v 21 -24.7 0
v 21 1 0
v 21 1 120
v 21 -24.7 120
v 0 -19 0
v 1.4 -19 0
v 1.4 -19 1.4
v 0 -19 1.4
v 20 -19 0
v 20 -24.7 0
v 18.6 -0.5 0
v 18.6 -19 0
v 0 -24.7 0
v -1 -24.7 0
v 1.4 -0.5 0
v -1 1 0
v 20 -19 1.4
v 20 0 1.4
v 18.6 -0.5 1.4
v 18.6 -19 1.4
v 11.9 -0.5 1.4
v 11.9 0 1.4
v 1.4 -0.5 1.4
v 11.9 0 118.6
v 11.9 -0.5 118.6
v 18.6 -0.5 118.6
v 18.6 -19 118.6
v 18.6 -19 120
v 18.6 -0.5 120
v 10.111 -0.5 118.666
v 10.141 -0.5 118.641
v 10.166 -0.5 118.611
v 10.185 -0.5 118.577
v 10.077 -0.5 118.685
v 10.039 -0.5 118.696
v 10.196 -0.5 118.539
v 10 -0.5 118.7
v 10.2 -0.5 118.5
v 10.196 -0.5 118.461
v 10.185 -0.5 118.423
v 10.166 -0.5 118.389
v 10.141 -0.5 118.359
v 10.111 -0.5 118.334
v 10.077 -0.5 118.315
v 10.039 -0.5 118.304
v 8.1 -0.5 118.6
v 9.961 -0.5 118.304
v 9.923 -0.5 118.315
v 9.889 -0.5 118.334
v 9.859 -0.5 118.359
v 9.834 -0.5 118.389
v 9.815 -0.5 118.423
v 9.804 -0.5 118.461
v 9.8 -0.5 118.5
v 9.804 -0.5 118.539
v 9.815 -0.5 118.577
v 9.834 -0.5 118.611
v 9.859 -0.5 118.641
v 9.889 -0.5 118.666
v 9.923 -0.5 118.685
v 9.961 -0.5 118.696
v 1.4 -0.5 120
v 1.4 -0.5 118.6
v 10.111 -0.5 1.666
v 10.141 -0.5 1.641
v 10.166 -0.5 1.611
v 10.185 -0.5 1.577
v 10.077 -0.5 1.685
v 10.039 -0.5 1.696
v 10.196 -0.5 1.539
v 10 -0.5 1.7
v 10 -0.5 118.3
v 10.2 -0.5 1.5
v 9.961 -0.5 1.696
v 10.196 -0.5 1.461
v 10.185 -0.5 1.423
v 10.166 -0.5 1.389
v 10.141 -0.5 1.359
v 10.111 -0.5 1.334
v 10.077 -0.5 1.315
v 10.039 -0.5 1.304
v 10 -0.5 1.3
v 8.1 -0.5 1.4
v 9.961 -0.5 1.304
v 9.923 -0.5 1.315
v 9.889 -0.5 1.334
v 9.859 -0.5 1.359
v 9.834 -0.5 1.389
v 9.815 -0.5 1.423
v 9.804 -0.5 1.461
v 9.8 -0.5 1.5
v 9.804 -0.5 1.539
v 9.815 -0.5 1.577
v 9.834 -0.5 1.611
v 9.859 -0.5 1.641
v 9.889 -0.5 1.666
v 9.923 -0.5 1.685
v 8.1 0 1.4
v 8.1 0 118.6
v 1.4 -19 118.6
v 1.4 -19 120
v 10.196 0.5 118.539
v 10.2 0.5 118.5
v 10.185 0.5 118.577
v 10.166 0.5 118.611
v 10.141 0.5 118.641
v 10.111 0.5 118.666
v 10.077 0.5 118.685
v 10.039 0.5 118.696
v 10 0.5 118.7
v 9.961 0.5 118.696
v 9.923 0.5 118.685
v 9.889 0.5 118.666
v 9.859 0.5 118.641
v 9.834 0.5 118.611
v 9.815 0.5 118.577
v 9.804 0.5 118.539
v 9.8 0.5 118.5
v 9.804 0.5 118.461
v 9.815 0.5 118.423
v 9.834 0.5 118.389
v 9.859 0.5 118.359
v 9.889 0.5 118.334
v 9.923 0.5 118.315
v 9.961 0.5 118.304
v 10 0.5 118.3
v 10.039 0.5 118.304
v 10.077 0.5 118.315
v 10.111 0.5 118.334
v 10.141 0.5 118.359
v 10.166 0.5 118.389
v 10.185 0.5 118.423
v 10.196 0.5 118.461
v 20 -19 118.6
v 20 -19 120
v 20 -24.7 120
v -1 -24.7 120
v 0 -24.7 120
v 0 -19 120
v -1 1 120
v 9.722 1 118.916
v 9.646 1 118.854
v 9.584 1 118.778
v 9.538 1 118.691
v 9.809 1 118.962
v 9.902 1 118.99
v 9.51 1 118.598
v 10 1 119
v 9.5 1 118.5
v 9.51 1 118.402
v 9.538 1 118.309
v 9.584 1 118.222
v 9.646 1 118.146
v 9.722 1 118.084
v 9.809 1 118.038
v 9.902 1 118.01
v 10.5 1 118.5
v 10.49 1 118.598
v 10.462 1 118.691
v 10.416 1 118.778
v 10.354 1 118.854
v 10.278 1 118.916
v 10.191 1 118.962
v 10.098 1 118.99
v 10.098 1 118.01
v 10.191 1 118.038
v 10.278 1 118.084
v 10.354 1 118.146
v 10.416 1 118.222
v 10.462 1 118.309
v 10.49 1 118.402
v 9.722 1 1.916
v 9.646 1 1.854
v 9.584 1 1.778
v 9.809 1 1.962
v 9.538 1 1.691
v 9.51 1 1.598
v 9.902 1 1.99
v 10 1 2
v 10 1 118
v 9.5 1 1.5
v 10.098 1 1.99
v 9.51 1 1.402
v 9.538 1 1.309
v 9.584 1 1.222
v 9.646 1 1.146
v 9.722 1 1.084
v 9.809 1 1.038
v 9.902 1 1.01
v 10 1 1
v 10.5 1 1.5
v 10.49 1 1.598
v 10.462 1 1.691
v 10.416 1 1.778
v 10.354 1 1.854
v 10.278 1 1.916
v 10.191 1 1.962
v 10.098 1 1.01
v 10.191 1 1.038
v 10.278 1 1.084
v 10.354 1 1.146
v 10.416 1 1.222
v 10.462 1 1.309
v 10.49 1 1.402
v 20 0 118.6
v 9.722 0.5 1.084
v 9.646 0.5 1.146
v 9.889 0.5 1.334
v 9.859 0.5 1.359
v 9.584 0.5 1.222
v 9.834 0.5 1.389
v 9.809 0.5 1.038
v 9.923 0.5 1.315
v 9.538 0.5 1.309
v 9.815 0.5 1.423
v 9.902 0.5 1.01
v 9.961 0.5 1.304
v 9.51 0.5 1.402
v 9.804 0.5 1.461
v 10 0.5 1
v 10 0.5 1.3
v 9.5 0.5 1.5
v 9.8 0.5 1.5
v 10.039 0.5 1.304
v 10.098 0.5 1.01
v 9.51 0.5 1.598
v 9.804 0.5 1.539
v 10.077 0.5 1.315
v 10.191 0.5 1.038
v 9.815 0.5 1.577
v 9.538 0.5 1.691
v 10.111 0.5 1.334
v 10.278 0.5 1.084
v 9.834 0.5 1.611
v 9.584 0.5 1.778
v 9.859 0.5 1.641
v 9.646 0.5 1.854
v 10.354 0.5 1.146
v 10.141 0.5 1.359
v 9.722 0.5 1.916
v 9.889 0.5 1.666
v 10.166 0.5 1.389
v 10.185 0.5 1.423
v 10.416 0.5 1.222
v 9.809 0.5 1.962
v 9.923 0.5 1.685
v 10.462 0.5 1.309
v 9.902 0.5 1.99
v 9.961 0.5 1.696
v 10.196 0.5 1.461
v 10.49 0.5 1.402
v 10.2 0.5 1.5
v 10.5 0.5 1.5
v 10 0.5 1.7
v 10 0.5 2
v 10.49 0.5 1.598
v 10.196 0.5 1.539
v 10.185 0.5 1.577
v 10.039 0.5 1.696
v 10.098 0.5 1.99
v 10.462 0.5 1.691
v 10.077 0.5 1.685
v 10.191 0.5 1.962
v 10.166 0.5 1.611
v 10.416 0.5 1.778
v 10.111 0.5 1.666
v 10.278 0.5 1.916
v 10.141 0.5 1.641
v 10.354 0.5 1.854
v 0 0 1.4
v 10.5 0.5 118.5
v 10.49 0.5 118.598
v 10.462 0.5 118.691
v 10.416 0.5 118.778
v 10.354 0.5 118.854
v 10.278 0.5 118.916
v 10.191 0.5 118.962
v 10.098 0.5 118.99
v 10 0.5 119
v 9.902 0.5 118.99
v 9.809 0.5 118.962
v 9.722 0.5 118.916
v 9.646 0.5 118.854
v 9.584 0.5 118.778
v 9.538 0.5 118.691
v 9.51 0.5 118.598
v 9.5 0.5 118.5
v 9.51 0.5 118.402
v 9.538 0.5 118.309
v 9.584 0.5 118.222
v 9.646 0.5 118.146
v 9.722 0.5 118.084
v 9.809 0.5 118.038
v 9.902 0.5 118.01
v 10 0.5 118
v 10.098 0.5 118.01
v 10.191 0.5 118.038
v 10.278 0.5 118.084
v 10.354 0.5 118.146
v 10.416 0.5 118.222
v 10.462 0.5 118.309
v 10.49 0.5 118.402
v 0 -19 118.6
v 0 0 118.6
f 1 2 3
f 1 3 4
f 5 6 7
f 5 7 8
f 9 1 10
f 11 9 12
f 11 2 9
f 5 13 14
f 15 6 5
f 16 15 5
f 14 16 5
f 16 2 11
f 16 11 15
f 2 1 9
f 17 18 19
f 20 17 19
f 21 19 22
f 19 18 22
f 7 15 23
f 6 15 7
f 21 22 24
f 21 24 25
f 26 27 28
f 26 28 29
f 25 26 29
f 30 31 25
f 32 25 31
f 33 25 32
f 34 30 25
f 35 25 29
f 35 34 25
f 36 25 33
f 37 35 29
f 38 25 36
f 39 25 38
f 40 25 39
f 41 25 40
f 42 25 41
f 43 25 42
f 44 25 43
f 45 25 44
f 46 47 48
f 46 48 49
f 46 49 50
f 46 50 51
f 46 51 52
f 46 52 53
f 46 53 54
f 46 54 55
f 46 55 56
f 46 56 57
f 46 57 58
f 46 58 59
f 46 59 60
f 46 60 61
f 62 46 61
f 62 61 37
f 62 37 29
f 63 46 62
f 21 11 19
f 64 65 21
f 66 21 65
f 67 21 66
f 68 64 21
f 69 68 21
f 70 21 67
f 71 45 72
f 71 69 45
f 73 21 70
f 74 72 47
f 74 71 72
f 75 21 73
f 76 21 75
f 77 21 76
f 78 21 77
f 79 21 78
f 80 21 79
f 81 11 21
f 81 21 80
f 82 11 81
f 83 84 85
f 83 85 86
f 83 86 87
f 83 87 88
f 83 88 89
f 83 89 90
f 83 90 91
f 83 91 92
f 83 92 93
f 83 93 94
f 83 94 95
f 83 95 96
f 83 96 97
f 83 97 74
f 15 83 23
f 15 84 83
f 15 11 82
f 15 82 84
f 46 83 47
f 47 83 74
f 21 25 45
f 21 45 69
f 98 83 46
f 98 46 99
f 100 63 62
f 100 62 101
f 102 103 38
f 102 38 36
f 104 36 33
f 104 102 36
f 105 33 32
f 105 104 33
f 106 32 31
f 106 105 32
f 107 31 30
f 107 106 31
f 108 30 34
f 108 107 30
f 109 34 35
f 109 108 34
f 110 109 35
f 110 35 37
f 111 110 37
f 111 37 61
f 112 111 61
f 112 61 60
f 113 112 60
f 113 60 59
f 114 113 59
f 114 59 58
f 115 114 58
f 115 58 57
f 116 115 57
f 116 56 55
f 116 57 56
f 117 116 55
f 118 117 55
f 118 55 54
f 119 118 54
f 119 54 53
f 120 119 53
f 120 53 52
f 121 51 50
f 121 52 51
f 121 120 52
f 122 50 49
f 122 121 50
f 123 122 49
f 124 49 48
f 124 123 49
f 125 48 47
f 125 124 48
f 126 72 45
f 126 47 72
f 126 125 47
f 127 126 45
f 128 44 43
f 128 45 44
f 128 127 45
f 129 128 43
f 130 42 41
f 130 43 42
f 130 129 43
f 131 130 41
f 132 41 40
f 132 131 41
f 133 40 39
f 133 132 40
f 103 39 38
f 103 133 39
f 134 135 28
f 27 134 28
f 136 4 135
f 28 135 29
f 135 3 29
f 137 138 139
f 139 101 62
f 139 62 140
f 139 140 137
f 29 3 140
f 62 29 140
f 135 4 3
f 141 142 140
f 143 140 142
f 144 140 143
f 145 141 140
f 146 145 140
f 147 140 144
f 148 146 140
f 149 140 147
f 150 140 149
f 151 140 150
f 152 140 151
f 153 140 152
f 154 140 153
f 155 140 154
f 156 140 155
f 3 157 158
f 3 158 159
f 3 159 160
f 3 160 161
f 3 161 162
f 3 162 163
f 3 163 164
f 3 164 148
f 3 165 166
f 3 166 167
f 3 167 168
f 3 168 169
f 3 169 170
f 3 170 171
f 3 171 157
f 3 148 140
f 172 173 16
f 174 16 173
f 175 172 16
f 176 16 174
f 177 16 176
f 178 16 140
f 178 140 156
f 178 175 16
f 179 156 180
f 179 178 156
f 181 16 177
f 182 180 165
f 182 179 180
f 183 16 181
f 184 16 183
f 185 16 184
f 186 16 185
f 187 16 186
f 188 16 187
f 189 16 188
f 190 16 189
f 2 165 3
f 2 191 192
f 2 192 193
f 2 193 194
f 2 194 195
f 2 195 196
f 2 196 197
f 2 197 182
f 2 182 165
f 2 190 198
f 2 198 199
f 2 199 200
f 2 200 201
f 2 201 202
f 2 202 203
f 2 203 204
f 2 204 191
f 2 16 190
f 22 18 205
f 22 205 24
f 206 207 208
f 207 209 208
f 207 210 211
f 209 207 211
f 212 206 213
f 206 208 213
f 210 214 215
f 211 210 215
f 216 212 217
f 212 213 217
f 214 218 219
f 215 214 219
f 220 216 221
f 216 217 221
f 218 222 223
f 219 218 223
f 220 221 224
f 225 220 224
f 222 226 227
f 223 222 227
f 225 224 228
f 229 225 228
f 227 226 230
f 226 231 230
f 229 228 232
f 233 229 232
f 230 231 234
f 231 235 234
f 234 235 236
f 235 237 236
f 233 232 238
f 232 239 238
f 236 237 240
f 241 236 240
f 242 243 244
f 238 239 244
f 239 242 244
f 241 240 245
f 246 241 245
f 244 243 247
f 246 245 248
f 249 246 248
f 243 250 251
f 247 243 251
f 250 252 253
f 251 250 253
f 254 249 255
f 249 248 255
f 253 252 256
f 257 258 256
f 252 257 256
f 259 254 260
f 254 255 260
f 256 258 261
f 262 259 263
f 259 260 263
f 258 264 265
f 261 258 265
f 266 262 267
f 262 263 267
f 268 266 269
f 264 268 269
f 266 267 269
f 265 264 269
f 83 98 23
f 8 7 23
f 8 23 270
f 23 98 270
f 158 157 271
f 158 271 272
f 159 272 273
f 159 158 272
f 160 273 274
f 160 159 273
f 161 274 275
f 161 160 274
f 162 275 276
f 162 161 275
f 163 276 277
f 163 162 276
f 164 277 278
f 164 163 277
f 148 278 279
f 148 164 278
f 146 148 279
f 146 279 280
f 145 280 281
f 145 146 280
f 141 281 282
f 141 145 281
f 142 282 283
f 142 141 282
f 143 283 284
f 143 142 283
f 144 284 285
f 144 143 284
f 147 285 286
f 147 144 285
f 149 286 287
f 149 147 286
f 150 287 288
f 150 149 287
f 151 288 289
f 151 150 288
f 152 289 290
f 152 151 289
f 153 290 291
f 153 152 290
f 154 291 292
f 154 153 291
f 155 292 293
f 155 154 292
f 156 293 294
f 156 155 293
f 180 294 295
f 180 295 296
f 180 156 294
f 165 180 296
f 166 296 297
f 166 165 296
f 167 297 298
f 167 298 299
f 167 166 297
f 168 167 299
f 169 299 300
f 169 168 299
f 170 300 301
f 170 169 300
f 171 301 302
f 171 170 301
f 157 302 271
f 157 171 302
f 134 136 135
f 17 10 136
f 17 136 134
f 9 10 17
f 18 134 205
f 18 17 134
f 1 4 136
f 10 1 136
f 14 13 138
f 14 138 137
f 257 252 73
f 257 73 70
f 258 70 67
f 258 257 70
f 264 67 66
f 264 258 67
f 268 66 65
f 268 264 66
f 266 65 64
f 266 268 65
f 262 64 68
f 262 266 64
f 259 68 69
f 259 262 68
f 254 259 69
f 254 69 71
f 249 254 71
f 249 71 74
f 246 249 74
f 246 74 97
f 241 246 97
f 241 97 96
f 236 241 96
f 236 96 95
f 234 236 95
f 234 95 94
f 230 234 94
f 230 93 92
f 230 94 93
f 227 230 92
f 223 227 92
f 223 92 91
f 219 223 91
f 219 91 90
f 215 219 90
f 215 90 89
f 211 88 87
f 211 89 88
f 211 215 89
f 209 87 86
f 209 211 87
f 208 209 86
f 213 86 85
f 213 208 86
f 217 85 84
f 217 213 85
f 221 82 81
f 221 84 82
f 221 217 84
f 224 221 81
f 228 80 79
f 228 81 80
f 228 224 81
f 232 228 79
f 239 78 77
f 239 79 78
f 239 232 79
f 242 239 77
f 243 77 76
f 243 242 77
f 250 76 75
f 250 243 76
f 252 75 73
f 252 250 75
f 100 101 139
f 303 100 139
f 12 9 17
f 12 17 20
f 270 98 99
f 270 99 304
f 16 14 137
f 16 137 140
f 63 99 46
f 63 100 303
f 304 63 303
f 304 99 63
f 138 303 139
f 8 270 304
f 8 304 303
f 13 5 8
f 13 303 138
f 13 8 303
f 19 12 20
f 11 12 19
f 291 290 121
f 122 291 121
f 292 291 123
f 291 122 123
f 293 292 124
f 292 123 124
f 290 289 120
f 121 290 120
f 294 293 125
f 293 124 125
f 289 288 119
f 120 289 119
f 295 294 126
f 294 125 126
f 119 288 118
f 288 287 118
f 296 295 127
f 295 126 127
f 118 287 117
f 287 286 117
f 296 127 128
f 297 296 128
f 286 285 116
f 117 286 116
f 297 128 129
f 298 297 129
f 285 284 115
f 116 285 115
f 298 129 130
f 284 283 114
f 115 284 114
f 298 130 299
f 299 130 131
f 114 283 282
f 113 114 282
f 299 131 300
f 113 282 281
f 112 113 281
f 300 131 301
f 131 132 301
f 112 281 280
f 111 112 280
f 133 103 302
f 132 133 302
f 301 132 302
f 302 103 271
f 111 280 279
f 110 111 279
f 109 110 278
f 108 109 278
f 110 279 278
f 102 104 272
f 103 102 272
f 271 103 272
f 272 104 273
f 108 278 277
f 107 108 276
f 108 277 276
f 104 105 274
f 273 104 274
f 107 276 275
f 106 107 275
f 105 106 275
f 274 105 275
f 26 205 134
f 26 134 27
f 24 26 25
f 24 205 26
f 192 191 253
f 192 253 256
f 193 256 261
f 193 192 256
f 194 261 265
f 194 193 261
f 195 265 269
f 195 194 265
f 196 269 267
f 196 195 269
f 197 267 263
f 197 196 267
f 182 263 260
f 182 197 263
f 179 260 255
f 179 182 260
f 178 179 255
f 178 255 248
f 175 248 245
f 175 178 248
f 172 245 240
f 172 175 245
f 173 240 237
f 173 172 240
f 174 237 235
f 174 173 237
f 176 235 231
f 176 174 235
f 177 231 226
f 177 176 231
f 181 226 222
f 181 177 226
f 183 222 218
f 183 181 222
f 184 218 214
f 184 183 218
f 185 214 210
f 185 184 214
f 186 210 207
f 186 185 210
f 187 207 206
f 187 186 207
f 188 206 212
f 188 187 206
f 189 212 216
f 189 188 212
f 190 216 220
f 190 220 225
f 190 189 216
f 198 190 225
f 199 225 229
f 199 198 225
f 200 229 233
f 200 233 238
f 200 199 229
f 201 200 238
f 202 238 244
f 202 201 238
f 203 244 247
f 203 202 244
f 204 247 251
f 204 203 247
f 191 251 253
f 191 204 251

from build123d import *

# Parameters (mm, degrees)
CYLINDER002_R        = 0.5
CYLINDER002_DEPTH    = 0.5
CYLINDER003_R        = 0.2
CYLINDER003_DEPTH    = 10
FUSION002_ROLL_ANGLE = 90
CYLINDER_R           = 0.5
CYLINDER_DEPTH       = 0.5
CYLINDER001_R        = 0.2
CYLINDER001_DEPTH    = 10
FUSION001_ROLL_ANGLE = 90
PAD_DEPTH            = 120
PAD002_DEPTH         = 1.4
PAD001_DEPTH         = 1.4


with BuildPart() as cylinder002:
    # Cylinder002 → Cylinder002 (new body)
    with BuildSketch(Plane(origin=(0, 3, 0), x_dir=(1, 0, 0), z_dir=(0, 0, 1))):
        Circle(CYLINDER002_R)
    extrude(amount=CYLINDER002_DEPTH)


with BuildPart() as screwhole2:
    # Cylinder003 → Cylinder003 (new body)
    with BuildSketch(Plane(origin=(0, 3, 0), x_dir=(1, 0, 0), z_dir=(0, 0, 1))):
        Circle(CYLINDER003_R)
    extrude(amount=CYLINDER003_DEPTH)

    # Fusion002: union Cylinder002
    add(cylinder002.part)


with BuildPart() as screwhole2_1:
    # Fusion002 roll: moved
    add(screwhole2.part.rotate(Axis((0, 0, 0), (1, 0, 0)), FUSION002_ROLL_ANGLE))


with BuildPart() as screwhole2_2:
    # Fusion002 placement: moved
    add(screwhole2_1.part.moved(Location((10, 1, 115.5))))


with BuildPart() as cylinder:
    # Cylinder → Cylinder (new body)
    with BuildSketch(Plane(origin=(0, 3, 0), x_dir=(1, 0, 0), z_dir=(0, 0, 1))):
        Circle(CYLINDER_R)
    extrude(amount=CYLINDER_DEPTH)


with BuildPart() as screws:
    # Cylinder001 → Cylinder001 (new body)
    with BuildSketch(Plane(origin=(0, 3, 0), x_dir=(1, 0, 0), z_dir=(0, 0, 1))):
        Circle(CYLINDER001_R)
    extrude(amount=CYLINDER001_DEPTH)

    # Fusion001: union Cylinder
    add(cylinder.part)


with BuildPart() as screws_1:
    # Fusion001 roll: moved
    add(screws.part.rotate(Axis((0, 0, 0), (1, 0, 0)), FUSION001_ROLL_ANGLE))


with BuildPart() as screws_2:
    # Fusion001 placement: moved
    add(screws_1.part.moved(Location((10, 1, -1.5))))

    # Fusion003: union screwhole2
    add(screwhole2_2.part)


with BuildPart() as outerform:
    # Sketch → Pad (new body)
    with BuildSketch(Plane.XY):
        Polygon((-1, 1), (21, 1), (21, -24.7), (20, -24.7), (20, 0), (11.9, 0), (11.9, -0.5), (8.1, -0.5), (8.1, 0), (0, 0), (0, -24.7), (-1, -24.7), align=None)
    extrude(amount=PAD_DEPTH)


with BuildPart() as upper_slide:
    # Sketch002 → Pad002 (new body)
    with BuildSketch(Plane.XY.offset(118.6)):
        Polygon((0, 0), (20, 0), (20, -19), (18.6, -19), (18.6, -0.5), (1.4, -0.5), (1.4, -19), (0, -19), align=None)
    extrude(amount=PAD002_DEPTH)


with BuildPart() as shellwithholes:
    # Sketch001 → Pad001 (new body)
    with BuildSketch(Plane.XY):
        Polygon((0, 0), (20, 0), (20, -19), (18.6, -19), (18.6, -0.5), (1.4, -0.5), (1.4, -19), (0, -19), align=None)
    extrude(amount=PAD001_DEPTH)

    # Fusion: union Outerform, upper_slide
    add(outerform.part)
    add(upper_slide.part)

    # Cut: cut screws
    add(screws_2.part, mode=Mode.SUBTRACT)


solid = shellwithholes.part
